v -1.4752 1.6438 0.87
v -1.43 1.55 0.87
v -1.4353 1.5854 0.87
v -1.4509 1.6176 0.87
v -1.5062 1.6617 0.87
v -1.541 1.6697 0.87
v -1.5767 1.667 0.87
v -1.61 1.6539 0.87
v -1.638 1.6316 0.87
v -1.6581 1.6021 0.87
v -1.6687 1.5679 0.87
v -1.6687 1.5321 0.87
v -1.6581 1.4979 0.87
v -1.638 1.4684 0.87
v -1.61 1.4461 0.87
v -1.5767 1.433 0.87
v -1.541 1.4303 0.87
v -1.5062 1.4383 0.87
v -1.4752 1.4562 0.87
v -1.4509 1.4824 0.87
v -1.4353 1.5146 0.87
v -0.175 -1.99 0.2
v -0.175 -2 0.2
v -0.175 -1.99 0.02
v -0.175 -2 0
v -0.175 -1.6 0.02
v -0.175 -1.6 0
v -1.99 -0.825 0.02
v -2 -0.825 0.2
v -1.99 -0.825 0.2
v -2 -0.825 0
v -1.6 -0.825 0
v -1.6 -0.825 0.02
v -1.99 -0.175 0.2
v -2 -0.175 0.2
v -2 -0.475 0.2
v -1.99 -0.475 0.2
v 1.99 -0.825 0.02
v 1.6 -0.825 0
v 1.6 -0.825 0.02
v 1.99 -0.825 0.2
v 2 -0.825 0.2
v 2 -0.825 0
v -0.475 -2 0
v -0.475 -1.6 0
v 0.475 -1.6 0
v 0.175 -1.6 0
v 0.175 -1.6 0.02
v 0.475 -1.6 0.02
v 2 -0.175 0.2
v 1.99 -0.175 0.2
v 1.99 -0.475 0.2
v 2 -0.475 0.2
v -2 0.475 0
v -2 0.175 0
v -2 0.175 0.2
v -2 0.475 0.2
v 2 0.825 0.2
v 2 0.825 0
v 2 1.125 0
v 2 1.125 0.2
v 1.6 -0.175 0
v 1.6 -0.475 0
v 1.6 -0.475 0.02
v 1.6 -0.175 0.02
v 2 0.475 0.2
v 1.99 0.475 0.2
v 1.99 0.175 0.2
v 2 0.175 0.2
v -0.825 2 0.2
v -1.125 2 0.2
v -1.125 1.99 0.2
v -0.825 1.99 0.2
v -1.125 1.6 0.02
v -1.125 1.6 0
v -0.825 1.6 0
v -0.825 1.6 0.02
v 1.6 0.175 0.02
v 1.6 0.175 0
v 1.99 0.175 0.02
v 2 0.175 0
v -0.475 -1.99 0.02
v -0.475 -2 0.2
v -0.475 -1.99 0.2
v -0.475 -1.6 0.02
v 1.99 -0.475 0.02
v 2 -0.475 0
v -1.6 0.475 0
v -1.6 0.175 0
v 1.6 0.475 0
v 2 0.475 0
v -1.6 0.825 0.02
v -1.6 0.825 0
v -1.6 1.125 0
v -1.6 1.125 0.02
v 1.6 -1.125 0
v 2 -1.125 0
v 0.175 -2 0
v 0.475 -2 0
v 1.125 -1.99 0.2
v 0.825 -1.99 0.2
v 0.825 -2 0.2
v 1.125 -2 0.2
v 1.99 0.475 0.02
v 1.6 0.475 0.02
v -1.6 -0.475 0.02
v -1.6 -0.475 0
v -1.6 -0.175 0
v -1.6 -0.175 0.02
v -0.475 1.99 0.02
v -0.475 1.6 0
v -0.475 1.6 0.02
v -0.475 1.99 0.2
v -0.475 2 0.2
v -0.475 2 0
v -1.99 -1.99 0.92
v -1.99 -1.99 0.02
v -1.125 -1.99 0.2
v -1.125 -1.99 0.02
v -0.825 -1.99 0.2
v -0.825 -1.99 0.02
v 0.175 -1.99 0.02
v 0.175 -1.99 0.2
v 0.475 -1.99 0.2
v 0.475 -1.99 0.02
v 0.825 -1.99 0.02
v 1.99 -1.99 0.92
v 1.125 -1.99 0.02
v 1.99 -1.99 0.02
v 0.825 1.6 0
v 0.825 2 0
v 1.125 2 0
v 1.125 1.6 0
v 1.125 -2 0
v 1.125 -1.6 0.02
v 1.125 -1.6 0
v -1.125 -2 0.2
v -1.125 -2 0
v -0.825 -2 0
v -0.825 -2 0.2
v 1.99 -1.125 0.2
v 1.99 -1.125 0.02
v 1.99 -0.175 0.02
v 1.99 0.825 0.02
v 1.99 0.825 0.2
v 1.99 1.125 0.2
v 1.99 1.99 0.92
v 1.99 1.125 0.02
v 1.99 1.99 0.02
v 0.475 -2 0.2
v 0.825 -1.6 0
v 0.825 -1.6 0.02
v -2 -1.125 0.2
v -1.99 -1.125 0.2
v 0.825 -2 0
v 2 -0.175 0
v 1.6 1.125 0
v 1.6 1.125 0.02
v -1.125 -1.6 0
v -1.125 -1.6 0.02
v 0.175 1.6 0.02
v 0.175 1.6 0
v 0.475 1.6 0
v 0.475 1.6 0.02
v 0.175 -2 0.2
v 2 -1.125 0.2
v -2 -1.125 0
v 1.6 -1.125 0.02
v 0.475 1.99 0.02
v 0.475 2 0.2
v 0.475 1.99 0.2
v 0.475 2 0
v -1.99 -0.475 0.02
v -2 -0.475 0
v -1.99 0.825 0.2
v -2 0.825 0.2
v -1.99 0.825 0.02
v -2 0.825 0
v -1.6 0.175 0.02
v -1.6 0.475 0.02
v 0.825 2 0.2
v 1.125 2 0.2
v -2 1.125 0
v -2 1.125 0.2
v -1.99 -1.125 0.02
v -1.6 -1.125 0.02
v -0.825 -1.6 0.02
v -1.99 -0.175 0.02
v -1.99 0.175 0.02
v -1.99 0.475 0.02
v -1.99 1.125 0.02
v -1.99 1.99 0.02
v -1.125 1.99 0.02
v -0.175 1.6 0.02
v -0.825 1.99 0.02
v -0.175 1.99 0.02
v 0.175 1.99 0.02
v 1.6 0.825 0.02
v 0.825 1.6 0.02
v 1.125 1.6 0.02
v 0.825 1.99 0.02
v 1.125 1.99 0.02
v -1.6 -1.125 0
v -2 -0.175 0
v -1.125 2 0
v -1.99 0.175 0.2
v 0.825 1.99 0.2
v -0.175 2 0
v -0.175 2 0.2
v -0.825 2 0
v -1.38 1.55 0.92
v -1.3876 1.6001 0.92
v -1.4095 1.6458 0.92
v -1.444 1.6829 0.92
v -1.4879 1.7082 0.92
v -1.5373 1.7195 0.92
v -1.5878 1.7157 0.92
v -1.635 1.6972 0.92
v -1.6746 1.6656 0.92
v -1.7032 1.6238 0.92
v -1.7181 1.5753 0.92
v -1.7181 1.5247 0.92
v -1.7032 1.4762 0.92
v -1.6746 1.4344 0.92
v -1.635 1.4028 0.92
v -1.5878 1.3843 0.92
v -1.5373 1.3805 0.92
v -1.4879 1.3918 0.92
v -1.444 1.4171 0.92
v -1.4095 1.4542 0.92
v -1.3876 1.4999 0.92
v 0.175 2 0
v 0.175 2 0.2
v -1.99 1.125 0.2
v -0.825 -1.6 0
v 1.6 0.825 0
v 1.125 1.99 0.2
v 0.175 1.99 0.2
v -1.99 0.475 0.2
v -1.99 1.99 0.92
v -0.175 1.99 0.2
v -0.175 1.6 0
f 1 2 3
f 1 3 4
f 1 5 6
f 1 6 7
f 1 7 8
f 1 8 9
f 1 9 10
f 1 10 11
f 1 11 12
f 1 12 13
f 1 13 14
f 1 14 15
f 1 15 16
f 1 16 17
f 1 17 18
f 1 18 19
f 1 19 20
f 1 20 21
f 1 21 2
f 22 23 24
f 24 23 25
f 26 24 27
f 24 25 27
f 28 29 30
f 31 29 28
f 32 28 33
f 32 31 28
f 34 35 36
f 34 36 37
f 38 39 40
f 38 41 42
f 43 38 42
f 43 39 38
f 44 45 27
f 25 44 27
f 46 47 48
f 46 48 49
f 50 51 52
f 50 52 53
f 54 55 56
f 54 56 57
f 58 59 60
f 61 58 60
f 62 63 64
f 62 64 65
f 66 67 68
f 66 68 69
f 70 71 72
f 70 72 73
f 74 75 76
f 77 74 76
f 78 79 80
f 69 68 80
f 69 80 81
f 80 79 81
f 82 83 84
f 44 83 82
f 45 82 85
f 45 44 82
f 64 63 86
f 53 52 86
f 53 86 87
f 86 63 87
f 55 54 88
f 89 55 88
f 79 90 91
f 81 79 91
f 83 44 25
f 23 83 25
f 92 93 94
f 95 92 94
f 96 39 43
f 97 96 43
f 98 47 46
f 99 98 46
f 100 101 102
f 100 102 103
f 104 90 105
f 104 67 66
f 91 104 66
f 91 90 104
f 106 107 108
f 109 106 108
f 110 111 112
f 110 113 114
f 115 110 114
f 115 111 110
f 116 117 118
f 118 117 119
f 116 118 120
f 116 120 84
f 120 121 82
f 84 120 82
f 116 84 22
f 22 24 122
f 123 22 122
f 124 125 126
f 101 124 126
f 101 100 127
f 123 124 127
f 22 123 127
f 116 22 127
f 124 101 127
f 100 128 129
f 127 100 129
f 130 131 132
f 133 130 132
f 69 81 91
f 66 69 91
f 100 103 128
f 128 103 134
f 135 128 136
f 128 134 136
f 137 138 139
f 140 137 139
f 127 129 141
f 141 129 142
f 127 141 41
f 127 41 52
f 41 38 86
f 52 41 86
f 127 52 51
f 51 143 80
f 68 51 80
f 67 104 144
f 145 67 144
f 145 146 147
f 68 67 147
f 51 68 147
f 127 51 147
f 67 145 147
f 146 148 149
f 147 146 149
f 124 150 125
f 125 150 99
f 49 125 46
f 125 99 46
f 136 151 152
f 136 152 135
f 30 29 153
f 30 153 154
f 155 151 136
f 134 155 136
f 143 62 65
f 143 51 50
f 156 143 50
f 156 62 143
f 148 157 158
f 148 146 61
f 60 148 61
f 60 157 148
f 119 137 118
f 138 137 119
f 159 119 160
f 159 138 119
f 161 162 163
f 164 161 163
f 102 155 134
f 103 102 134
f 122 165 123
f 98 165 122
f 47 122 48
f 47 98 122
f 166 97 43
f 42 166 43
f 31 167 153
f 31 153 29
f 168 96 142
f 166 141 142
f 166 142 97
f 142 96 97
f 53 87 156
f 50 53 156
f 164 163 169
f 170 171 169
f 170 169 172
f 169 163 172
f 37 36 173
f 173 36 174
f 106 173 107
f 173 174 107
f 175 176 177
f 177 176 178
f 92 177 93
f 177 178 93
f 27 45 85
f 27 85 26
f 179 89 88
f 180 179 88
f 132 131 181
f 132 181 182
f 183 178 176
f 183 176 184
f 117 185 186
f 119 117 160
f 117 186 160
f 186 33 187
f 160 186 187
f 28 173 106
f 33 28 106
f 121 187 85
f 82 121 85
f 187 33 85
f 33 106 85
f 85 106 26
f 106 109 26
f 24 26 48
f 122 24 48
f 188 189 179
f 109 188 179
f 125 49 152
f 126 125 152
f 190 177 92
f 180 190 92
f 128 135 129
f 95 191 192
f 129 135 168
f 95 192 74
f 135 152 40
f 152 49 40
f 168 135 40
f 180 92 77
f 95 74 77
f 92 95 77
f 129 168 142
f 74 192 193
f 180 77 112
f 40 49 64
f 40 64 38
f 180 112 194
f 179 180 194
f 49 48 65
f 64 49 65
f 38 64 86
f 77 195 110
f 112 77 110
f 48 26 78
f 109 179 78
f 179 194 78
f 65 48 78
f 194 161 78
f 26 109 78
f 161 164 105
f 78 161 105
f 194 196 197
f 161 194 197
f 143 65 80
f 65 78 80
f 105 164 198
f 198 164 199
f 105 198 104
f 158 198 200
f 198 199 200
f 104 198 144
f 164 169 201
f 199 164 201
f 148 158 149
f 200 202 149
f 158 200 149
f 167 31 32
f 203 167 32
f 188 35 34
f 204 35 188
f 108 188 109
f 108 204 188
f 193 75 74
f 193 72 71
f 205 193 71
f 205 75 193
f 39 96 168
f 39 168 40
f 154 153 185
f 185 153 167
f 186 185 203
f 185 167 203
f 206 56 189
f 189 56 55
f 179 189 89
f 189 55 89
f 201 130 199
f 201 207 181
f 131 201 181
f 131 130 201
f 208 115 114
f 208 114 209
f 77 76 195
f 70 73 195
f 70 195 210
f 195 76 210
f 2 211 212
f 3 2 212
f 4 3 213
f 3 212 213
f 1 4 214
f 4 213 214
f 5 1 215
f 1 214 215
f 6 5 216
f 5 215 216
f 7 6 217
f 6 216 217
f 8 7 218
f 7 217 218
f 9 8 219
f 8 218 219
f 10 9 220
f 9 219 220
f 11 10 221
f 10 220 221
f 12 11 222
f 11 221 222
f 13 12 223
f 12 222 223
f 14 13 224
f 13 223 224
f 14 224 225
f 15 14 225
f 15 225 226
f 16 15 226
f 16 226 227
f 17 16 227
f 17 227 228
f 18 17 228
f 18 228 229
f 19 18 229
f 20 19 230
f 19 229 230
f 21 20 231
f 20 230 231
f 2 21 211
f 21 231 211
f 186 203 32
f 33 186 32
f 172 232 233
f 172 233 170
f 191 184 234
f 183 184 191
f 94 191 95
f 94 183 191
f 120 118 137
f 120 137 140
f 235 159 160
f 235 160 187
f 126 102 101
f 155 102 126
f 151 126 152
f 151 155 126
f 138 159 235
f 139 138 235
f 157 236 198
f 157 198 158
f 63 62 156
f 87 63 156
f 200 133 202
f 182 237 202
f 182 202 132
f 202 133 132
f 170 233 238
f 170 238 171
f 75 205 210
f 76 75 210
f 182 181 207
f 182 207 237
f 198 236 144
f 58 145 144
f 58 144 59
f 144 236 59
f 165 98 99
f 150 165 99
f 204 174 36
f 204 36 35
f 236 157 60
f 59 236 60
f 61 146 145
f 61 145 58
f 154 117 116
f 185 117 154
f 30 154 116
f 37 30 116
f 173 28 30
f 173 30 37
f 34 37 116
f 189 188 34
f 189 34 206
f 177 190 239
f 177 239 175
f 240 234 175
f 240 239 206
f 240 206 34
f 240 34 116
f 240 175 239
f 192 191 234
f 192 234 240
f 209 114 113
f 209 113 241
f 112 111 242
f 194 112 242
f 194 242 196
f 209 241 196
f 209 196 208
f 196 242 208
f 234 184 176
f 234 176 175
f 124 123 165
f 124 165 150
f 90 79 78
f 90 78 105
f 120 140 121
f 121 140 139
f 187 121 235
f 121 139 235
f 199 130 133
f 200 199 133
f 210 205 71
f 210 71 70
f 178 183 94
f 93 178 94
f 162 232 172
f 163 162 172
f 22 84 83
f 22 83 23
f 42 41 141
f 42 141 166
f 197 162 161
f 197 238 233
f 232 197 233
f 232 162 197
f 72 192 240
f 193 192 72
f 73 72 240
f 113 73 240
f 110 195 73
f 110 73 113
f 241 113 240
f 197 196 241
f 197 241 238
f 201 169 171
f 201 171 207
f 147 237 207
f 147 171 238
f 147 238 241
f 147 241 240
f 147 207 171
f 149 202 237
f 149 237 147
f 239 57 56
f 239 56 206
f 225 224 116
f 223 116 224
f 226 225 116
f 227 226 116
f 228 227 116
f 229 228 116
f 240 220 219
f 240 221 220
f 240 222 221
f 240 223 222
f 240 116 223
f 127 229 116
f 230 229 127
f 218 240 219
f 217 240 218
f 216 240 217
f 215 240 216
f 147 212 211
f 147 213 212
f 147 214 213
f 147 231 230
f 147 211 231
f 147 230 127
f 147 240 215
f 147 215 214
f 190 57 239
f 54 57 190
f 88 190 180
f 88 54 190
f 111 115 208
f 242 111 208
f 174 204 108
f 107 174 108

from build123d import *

# Parameters (mm, degrees)
EXTRUDE_START       = 0.02
SKETCH_1_W          = 3.98
SKETCH_1_H          = 3.98
EXTRUDE_1_DEPTH     = 0.9
SKETCH_2_R          = 0.17
CUT_EXTRUDE_2_DEPTH = 0.05
CUT_EXTRUDE_2_DRAFT = -45
SKETCH_3_W          = 0.4
SKETCH_3_H          = 0.3
SKETCH_3_W_2        = 0.3
SKETCH_3_H_2        = 0.4
EXTRUDE_3_DEPTH     = 0.2


with BuildPart() as part:
    # Эскиз1 → Вытянуть1 (new body)
    with BuildSketch(Plane.XY.offset(EXTRUDE_START)):
        Rectangle(SKETCH_1_W, SKETCH_1_H)
    extrude(amount=EXTRUDE_1_DEPTH)


with BuildPart() as cut_extrude_2_tool:
    # Эскиз2 → Вытянуть2 (with draft: the straight prism first)
    with BuildSketch(Plane.XY.offset(0.92)):
        with Locations((-1.55, 1.55)):
            Circle(SKETCH_2_R)
    extrude(amount=-CUT_EXTRUDE_2_DEPTH)
    # Вытянуть2: the draft: its side faces are tilted about the plane it starts from
    cut_extrude_2_sides = [cut_extrude_2_tool.faces().sort_by_distance(p)[0] for p in [
        (-1.72, 1.55, 0.895),
    ]]
    draft(cut_extrude_2_sides, Plane.XY.offset(0.92), CUT_EXTRUDE_2_DRAFT)


with BuildPart() as part_1:
    add(part.part)

    # Вытянуть2: cut by cut_extrude_2_tool
    add(cut_extrude_2_tool.part, mode=Mode.SUBTRACT)

    # Эскиз3 → Вытянуть3 (add)
    with BuildSketch(Plane.XY):
        with Locations((-1.8, -0.325)):
            Rectangle(SKETCH_3_W, SKETCH_3_H)
        with Locations((-1.8, -0.975)):
            Rectangle(SKETCH_3_W, SKETCH_3_H)
        with Locations((-1.8, 0.975)):
            Rectangle(SKETCH_3_W, SKETCH_3_H)
        with Locations((-1.8, 0.325)):
            Rectangle(SKETCH_3_W, SKETCH_3_H)
        with Locations((-0.325, 1.8)):
            Rectangle(SKETCH_3_W_2, SKETCH_3_H_2)
        with Locations((-0.975, 1.8)):
            Rectangle(SKETCH_3_W_2, SKETCH_3_H_2)
        with Locations((0.975, 1.8)):
            Rectangle(SKETCH_3_W_2, SKETCH_3_H_2)
        with Locations((0.325, 1.8)):
            Rectangle(SKETCH_3_W_2, SKETCH_3_H_2)
        with Locations((1.8, 0.325)):
            Rectangle(SKETCH_3_W, SKETCH_3_H)
        with Locations((1.8, 0.975)):
            Rectangle(SKETCH_3_W, SKETCH_3_H)
        with Locations((1.8, -0.975)):
            Rectangle(SKETCH_3_W, SKETCH_3_H)
        with Locations((1.8, -0.325)):
            Rectangle(SKETCH_3_W, SKETCH_3_H)
        with Locations((0.325, -1.8)):
            Rectangle(SKETCH_3_W_2, SKETCH_3_H_2)
        with Locations((0.975, -1.8)):
            Rectangle(SKETCH_3_W_2, SKETCH_3_H_2)
        with Locations((-0.975, -1.8)):
            Rectangle(SKETCH_3_W_2, SKETCH_3_H_2)
        with Locations((-0.325, -1.8)):
            Rectangle(SKETCH_3_W_2, SKETCH_3_H_2)
    extrude(amount=EXTRUDE_3_DEPTH)


solid = part_1.part
